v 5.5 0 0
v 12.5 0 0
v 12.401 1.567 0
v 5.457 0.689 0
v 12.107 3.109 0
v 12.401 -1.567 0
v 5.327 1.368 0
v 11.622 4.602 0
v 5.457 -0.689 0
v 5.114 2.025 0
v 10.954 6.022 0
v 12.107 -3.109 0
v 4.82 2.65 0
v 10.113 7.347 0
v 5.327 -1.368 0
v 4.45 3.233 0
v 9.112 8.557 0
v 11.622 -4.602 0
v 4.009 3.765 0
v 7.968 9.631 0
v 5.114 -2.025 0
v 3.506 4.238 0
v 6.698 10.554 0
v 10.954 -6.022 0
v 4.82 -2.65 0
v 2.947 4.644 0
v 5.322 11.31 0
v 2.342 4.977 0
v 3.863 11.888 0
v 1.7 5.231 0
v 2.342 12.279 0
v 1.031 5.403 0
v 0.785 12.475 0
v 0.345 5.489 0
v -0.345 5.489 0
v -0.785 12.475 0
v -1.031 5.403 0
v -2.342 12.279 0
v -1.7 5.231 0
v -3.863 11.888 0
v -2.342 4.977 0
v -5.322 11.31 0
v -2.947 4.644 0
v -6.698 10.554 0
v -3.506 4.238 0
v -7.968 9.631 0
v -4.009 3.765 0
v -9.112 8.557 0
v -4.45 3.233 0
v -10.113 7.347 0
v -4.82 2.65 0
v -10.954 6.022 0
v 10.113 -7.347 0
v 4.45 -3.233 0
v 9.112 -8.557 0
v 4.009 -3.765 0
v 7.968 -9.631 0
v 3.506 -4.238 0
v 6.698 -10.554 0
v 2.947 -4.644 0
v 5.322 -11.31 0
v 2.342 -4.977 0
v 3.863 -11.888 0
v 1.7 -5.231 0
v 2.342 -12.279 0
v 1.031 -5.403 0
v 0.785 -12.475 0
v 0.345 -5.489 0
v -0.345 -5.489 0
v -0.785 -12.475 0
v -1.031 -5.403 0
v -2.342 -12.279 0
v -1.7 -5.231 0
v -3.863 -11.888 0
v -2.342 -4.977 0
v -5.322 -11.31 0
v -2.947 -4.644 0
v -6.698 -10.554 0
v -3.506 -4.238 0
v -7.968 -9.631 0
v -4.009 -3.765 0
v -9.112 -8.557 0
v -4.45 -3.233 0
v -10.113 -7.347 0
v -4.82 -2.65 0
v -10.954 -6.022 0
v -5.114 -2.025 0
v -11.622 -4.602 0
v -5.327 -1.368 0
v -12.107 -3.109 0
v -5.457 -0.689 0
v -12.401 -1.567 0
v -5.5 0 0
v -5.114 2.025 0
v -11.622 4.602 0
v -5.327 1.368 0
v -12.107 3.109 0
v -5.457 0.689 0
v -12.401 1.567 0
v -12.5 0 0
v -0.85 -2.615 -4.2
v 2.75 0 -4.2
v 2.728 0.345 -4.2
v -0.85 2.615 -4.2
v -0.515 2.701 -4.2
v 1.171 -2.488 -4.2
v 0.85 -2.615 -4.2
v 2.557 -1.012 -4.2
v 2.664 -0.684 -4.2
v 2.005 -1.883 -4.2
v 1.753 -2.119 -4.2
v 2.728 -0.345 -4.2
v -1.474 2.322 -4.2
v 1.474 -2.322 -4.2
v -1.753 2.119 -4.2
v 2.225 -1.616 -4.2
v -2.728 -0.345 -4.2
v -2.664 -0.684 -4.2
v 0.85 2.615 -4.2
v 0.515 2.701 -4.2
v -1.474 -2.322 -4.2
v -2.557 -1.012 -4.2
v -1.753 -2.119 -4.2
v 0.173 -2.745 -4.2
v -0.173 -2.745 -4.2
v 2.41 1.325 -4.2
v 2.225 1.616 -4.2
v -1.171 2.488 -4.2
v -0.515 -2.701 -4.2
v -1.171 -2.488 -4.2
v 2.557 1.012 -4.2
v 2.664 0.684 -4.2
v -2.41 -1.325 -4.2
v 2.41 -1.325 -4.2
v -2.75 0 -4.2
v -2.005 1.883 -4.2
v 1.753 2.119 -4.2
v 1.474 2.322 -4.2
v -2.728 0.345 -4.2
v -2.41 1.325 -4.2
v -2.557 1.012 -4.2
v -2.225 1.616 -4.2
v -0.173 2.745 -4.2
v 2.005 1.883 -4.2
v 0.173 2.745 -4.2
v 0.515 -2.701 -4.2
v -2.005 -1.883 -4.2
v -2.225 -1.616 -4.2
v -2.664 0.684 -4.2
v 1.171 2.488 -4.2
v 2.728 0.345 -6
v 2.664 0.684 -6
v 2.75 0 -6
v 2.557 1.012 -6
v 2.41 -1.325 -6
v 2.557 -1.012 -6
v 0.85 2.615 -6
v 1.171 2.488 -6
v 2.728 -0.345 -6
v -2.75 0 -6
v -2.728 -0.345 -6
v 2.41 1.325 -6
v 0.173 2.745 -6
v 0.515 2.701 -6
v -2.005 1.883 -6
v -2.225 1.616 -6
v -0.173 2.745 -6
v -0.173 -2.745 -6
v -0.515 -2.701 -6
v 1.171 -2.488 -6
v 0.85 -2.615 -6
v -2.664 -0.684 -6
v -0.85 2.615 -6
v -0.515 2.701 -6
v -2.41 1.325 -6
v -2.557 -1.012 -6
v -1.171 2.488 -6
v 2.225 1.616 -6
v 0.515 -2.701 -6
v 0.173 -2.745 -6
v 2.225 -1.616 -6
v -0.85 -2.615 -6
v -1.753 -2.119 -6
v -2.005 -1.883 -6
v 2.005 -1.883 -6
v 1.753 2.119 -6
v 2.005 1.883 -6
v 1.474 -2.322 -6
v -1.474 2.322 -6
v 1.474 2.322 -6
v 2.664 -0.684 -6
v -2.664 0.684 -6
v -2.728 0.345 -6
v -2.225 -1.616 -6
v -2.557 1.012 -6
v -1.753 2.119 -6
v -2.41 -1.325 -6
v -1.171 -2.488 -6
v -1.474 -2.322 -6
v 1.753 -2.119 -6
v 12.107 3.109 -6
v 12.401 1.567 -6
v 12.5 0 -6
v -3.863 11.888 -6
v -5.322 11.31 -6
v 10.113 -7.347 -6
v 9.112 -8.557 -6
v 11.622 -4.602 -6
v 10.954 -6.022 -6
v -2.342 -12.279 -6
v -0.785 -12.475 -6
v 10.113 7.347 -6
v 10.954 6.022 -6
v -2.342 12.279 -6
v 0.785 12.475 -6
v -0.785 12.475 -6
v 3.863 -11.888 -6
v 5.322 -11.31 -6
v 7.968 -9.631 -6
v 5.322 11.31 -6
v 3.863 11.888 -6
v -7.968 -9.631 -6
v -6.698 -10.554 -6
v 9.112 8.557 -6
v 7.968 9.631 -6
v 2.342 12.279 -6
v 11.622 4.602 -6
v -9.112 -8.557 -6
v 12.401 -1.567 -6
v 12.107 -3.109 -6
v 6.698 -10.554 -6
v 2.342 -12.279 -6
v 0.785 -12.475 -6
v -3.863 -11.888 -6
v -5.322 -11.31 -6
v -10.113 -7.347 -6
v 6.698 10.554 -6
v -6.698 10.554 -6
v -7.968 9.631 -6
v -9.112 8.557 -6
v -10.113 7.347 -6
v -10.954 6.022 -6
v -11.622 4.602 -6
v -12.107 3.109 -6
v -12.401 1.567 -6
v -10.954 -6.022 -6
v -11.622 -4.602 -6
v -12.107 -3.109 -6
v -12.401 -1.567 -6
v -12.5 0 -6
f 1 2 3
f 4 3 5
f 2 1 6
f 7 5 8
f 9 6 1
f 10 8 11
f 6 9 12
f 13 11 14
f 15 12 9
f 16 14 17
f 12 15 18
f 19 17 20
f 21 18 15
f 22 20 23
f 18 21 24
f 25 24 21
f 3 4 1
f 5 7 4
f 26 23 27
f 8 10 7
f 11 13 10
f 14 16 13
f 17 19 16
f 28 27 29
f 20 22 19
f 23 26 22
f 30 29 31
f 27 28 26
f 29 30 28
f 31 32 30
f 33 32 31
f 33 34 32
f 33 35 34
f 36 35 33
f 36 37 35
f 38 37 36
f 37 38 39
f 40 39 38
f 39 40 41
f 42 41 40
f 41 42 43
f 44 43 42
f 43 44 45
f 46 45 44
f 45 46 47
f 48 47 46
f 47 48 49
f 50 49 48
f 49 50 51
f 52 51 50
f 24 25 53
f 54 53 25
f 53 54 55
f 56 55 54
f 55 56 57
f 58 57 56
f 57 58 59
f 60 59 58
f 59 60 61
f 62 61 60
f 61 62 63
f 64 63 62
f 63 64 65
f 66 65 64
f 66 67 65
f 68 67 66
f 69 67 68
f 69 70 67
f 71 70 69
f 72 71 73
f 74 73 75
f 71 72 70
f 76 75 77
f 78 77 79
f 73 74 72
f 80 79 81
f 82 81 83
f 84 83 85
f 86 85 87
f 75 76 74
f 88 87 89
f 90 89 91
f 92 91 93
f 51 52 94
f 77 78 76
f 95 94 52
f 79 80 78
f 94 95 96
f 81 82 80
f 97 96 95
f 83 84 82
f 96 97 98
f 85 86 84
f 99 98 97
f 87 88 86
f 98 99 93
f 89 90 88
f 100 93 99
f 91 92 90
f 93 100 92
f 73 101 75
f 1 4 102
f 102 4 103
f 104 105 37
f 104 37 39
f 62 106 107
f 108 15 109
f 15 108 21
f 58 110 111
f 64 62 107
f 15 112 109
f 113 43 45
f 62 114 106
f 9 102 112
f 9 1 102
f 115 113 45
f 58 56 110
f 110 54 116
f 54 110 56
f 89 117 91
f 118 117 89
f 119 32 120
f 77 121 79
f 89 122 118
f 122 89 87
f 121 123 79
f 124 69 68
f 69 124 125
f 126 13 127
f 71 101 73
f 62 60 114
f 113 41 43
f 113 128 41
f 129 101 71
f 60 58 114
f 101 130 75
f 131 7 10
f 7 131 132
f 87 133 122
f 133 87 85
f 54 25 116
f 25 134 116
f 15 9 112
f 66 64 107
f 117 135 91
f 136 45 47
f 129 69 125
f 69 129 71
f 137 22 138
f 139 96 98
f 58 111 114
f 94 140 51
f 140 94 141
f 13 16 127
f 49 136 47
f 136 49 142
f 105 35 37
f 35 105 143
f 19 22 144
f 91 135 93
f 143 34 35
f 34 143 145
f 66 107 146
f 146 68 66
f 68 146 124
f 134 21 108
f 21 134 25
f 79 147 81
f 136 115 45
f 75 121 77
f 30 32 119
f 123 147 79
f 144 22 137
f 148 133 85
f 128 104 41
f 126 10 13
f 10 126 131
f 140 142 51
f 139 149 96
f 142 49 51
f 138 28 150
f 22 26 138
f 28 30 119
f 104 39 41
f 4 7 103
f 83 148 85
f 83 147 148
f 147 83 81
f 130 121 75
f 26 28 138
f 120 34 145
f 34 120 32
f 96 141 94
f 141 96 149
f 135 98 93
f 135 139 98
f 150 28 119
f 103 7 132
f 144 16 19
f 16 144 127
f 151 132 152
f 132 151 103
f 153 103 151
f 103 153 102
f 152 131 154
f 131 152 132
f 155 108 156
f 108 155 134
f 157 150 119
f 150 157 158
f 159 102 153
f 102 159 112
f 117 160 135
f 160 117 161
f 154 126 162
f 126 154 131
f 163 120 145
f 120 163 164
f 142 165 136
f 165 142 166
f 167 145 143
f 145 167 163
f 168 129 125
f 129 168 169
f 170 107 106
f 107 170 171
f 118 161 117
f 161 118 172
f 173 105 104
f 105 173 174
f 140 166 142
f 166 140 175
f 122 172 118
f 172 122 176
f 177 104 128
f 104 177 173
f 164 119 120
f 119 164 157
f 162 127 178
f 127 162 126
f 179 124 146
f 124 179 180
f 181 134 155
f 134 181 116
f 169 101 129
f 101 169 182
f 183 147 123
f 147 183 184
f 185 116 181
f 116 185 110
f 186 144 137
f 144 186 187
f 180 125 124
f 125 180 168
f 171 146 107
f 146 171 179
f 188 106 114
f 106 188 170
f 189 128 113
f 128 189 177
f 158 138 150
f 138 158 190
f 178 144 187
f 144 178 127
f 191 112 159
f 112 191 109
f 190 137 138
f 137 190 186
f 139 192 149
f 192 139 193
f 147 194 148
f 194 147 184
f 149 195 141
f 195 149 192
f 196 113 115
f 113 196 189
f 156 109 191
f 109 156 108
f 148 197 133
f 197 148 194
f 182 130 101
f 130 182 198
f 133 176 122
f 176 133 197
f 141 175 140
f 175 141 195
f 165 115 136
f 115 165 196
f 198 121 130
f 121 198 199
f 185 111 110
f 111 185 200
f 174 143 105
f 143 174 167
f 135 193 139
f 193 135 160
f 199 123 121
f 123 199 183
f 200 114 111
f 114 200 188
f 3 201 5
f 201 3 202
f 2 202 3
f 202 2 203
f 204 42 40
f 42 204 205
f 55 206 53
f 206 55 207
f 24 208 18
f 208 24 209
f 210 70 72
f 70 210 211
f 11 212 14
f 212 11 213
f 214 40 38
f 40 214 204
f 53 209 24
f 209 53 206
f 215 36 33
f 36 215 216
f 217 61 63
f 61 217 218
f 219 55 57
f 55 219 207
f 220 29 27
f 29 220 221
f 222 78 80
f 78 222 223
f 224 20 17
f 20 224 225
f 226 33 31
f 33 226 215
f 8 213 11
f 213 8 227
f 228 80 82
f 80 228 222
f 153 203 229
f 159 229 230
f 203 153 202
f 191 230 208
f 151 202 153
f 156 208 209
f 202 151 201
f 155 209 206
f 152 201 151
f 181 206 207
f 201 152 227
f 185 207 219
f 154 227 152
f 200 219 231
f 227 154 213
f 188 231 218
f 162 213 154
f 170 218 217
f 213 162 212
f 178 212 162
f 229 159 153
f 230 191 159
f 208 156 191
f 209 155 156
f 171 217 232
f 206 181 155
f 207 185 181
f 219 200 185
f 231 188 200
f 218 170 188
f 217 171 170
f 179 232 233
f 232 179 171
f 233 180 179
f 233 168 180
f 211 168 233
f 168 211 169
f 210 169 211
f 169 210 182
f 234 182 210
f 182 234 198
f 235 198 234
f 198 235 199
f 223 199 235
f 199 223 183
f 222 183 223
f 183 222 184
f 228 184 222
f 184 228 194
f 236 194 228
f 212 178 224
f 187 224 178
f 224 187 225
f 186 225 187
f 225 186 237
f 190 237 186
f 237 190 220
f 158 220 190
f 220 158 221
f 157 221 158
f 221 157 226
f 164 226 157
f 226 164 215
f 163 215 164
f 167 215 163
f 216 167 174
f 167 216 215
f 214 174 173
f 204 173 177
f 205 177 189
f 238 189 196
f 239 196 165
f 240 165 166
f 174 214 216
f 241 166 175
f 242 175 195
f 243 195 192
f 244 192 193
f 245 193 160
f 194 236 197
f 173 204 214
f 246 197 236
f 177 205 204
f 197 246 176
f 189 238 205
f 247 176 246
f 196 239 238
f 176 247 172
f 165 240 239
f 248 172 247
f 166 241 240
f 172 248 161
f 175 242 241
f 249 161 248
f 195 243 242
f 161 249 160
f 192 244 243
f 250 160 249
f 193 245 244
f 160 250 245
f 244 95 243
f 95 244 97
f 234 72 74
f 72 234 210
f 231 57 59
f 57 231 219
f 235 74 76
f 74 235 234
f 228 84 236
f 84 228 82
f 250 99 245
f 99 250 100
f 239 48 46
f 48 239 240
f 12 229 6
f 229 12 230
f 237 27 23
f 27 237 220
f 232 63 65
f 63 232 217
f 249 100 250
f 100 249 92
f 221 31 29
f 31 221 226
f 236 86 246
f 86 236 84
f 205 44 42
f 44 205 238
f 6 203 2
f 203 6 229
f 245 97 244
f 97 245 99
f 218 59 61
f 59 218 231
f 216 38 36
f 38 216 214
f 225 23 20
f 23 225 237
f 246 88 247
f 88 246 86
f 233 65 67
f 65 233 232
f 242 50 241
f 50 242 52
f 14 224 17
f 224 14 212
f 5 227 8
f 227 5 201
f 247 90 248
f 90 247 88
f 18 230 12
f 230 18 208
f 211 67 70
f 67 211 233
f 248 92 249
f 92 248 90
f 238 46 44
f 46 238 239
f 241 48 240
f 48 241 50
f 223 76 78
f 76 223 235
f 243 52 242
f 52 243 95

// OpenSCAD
$fn = 50;

difference() {
	union() {
		translate(v = [0, 0, -6.0]) {
			cylinder(h = 6, r = 12.5);
		}
	}
	union() {
		translate(v = [0, 0, 0]) {
			rotate(a = [0, 0, 0]) {
				difference() {
					union() {
						translate(v = [0, 0, -9.0]) {
							cylinder(h = 9, r = 2.25);
						}
						translate(v = [0, 0, -4.2]) {
							cylinder(h = 4.2, r1 = 2.75, r2 = 5.5);
						}
						translate(v = [0, 0, -9.0]) {
							cylinder(h = 9, r = 2.75);
						}
						translate(v = [0, 0, -9.0]) {
							cylinder(h = 9, r = 2.25);
						}
					}
					union();
				}
			}
		}
	}
}
